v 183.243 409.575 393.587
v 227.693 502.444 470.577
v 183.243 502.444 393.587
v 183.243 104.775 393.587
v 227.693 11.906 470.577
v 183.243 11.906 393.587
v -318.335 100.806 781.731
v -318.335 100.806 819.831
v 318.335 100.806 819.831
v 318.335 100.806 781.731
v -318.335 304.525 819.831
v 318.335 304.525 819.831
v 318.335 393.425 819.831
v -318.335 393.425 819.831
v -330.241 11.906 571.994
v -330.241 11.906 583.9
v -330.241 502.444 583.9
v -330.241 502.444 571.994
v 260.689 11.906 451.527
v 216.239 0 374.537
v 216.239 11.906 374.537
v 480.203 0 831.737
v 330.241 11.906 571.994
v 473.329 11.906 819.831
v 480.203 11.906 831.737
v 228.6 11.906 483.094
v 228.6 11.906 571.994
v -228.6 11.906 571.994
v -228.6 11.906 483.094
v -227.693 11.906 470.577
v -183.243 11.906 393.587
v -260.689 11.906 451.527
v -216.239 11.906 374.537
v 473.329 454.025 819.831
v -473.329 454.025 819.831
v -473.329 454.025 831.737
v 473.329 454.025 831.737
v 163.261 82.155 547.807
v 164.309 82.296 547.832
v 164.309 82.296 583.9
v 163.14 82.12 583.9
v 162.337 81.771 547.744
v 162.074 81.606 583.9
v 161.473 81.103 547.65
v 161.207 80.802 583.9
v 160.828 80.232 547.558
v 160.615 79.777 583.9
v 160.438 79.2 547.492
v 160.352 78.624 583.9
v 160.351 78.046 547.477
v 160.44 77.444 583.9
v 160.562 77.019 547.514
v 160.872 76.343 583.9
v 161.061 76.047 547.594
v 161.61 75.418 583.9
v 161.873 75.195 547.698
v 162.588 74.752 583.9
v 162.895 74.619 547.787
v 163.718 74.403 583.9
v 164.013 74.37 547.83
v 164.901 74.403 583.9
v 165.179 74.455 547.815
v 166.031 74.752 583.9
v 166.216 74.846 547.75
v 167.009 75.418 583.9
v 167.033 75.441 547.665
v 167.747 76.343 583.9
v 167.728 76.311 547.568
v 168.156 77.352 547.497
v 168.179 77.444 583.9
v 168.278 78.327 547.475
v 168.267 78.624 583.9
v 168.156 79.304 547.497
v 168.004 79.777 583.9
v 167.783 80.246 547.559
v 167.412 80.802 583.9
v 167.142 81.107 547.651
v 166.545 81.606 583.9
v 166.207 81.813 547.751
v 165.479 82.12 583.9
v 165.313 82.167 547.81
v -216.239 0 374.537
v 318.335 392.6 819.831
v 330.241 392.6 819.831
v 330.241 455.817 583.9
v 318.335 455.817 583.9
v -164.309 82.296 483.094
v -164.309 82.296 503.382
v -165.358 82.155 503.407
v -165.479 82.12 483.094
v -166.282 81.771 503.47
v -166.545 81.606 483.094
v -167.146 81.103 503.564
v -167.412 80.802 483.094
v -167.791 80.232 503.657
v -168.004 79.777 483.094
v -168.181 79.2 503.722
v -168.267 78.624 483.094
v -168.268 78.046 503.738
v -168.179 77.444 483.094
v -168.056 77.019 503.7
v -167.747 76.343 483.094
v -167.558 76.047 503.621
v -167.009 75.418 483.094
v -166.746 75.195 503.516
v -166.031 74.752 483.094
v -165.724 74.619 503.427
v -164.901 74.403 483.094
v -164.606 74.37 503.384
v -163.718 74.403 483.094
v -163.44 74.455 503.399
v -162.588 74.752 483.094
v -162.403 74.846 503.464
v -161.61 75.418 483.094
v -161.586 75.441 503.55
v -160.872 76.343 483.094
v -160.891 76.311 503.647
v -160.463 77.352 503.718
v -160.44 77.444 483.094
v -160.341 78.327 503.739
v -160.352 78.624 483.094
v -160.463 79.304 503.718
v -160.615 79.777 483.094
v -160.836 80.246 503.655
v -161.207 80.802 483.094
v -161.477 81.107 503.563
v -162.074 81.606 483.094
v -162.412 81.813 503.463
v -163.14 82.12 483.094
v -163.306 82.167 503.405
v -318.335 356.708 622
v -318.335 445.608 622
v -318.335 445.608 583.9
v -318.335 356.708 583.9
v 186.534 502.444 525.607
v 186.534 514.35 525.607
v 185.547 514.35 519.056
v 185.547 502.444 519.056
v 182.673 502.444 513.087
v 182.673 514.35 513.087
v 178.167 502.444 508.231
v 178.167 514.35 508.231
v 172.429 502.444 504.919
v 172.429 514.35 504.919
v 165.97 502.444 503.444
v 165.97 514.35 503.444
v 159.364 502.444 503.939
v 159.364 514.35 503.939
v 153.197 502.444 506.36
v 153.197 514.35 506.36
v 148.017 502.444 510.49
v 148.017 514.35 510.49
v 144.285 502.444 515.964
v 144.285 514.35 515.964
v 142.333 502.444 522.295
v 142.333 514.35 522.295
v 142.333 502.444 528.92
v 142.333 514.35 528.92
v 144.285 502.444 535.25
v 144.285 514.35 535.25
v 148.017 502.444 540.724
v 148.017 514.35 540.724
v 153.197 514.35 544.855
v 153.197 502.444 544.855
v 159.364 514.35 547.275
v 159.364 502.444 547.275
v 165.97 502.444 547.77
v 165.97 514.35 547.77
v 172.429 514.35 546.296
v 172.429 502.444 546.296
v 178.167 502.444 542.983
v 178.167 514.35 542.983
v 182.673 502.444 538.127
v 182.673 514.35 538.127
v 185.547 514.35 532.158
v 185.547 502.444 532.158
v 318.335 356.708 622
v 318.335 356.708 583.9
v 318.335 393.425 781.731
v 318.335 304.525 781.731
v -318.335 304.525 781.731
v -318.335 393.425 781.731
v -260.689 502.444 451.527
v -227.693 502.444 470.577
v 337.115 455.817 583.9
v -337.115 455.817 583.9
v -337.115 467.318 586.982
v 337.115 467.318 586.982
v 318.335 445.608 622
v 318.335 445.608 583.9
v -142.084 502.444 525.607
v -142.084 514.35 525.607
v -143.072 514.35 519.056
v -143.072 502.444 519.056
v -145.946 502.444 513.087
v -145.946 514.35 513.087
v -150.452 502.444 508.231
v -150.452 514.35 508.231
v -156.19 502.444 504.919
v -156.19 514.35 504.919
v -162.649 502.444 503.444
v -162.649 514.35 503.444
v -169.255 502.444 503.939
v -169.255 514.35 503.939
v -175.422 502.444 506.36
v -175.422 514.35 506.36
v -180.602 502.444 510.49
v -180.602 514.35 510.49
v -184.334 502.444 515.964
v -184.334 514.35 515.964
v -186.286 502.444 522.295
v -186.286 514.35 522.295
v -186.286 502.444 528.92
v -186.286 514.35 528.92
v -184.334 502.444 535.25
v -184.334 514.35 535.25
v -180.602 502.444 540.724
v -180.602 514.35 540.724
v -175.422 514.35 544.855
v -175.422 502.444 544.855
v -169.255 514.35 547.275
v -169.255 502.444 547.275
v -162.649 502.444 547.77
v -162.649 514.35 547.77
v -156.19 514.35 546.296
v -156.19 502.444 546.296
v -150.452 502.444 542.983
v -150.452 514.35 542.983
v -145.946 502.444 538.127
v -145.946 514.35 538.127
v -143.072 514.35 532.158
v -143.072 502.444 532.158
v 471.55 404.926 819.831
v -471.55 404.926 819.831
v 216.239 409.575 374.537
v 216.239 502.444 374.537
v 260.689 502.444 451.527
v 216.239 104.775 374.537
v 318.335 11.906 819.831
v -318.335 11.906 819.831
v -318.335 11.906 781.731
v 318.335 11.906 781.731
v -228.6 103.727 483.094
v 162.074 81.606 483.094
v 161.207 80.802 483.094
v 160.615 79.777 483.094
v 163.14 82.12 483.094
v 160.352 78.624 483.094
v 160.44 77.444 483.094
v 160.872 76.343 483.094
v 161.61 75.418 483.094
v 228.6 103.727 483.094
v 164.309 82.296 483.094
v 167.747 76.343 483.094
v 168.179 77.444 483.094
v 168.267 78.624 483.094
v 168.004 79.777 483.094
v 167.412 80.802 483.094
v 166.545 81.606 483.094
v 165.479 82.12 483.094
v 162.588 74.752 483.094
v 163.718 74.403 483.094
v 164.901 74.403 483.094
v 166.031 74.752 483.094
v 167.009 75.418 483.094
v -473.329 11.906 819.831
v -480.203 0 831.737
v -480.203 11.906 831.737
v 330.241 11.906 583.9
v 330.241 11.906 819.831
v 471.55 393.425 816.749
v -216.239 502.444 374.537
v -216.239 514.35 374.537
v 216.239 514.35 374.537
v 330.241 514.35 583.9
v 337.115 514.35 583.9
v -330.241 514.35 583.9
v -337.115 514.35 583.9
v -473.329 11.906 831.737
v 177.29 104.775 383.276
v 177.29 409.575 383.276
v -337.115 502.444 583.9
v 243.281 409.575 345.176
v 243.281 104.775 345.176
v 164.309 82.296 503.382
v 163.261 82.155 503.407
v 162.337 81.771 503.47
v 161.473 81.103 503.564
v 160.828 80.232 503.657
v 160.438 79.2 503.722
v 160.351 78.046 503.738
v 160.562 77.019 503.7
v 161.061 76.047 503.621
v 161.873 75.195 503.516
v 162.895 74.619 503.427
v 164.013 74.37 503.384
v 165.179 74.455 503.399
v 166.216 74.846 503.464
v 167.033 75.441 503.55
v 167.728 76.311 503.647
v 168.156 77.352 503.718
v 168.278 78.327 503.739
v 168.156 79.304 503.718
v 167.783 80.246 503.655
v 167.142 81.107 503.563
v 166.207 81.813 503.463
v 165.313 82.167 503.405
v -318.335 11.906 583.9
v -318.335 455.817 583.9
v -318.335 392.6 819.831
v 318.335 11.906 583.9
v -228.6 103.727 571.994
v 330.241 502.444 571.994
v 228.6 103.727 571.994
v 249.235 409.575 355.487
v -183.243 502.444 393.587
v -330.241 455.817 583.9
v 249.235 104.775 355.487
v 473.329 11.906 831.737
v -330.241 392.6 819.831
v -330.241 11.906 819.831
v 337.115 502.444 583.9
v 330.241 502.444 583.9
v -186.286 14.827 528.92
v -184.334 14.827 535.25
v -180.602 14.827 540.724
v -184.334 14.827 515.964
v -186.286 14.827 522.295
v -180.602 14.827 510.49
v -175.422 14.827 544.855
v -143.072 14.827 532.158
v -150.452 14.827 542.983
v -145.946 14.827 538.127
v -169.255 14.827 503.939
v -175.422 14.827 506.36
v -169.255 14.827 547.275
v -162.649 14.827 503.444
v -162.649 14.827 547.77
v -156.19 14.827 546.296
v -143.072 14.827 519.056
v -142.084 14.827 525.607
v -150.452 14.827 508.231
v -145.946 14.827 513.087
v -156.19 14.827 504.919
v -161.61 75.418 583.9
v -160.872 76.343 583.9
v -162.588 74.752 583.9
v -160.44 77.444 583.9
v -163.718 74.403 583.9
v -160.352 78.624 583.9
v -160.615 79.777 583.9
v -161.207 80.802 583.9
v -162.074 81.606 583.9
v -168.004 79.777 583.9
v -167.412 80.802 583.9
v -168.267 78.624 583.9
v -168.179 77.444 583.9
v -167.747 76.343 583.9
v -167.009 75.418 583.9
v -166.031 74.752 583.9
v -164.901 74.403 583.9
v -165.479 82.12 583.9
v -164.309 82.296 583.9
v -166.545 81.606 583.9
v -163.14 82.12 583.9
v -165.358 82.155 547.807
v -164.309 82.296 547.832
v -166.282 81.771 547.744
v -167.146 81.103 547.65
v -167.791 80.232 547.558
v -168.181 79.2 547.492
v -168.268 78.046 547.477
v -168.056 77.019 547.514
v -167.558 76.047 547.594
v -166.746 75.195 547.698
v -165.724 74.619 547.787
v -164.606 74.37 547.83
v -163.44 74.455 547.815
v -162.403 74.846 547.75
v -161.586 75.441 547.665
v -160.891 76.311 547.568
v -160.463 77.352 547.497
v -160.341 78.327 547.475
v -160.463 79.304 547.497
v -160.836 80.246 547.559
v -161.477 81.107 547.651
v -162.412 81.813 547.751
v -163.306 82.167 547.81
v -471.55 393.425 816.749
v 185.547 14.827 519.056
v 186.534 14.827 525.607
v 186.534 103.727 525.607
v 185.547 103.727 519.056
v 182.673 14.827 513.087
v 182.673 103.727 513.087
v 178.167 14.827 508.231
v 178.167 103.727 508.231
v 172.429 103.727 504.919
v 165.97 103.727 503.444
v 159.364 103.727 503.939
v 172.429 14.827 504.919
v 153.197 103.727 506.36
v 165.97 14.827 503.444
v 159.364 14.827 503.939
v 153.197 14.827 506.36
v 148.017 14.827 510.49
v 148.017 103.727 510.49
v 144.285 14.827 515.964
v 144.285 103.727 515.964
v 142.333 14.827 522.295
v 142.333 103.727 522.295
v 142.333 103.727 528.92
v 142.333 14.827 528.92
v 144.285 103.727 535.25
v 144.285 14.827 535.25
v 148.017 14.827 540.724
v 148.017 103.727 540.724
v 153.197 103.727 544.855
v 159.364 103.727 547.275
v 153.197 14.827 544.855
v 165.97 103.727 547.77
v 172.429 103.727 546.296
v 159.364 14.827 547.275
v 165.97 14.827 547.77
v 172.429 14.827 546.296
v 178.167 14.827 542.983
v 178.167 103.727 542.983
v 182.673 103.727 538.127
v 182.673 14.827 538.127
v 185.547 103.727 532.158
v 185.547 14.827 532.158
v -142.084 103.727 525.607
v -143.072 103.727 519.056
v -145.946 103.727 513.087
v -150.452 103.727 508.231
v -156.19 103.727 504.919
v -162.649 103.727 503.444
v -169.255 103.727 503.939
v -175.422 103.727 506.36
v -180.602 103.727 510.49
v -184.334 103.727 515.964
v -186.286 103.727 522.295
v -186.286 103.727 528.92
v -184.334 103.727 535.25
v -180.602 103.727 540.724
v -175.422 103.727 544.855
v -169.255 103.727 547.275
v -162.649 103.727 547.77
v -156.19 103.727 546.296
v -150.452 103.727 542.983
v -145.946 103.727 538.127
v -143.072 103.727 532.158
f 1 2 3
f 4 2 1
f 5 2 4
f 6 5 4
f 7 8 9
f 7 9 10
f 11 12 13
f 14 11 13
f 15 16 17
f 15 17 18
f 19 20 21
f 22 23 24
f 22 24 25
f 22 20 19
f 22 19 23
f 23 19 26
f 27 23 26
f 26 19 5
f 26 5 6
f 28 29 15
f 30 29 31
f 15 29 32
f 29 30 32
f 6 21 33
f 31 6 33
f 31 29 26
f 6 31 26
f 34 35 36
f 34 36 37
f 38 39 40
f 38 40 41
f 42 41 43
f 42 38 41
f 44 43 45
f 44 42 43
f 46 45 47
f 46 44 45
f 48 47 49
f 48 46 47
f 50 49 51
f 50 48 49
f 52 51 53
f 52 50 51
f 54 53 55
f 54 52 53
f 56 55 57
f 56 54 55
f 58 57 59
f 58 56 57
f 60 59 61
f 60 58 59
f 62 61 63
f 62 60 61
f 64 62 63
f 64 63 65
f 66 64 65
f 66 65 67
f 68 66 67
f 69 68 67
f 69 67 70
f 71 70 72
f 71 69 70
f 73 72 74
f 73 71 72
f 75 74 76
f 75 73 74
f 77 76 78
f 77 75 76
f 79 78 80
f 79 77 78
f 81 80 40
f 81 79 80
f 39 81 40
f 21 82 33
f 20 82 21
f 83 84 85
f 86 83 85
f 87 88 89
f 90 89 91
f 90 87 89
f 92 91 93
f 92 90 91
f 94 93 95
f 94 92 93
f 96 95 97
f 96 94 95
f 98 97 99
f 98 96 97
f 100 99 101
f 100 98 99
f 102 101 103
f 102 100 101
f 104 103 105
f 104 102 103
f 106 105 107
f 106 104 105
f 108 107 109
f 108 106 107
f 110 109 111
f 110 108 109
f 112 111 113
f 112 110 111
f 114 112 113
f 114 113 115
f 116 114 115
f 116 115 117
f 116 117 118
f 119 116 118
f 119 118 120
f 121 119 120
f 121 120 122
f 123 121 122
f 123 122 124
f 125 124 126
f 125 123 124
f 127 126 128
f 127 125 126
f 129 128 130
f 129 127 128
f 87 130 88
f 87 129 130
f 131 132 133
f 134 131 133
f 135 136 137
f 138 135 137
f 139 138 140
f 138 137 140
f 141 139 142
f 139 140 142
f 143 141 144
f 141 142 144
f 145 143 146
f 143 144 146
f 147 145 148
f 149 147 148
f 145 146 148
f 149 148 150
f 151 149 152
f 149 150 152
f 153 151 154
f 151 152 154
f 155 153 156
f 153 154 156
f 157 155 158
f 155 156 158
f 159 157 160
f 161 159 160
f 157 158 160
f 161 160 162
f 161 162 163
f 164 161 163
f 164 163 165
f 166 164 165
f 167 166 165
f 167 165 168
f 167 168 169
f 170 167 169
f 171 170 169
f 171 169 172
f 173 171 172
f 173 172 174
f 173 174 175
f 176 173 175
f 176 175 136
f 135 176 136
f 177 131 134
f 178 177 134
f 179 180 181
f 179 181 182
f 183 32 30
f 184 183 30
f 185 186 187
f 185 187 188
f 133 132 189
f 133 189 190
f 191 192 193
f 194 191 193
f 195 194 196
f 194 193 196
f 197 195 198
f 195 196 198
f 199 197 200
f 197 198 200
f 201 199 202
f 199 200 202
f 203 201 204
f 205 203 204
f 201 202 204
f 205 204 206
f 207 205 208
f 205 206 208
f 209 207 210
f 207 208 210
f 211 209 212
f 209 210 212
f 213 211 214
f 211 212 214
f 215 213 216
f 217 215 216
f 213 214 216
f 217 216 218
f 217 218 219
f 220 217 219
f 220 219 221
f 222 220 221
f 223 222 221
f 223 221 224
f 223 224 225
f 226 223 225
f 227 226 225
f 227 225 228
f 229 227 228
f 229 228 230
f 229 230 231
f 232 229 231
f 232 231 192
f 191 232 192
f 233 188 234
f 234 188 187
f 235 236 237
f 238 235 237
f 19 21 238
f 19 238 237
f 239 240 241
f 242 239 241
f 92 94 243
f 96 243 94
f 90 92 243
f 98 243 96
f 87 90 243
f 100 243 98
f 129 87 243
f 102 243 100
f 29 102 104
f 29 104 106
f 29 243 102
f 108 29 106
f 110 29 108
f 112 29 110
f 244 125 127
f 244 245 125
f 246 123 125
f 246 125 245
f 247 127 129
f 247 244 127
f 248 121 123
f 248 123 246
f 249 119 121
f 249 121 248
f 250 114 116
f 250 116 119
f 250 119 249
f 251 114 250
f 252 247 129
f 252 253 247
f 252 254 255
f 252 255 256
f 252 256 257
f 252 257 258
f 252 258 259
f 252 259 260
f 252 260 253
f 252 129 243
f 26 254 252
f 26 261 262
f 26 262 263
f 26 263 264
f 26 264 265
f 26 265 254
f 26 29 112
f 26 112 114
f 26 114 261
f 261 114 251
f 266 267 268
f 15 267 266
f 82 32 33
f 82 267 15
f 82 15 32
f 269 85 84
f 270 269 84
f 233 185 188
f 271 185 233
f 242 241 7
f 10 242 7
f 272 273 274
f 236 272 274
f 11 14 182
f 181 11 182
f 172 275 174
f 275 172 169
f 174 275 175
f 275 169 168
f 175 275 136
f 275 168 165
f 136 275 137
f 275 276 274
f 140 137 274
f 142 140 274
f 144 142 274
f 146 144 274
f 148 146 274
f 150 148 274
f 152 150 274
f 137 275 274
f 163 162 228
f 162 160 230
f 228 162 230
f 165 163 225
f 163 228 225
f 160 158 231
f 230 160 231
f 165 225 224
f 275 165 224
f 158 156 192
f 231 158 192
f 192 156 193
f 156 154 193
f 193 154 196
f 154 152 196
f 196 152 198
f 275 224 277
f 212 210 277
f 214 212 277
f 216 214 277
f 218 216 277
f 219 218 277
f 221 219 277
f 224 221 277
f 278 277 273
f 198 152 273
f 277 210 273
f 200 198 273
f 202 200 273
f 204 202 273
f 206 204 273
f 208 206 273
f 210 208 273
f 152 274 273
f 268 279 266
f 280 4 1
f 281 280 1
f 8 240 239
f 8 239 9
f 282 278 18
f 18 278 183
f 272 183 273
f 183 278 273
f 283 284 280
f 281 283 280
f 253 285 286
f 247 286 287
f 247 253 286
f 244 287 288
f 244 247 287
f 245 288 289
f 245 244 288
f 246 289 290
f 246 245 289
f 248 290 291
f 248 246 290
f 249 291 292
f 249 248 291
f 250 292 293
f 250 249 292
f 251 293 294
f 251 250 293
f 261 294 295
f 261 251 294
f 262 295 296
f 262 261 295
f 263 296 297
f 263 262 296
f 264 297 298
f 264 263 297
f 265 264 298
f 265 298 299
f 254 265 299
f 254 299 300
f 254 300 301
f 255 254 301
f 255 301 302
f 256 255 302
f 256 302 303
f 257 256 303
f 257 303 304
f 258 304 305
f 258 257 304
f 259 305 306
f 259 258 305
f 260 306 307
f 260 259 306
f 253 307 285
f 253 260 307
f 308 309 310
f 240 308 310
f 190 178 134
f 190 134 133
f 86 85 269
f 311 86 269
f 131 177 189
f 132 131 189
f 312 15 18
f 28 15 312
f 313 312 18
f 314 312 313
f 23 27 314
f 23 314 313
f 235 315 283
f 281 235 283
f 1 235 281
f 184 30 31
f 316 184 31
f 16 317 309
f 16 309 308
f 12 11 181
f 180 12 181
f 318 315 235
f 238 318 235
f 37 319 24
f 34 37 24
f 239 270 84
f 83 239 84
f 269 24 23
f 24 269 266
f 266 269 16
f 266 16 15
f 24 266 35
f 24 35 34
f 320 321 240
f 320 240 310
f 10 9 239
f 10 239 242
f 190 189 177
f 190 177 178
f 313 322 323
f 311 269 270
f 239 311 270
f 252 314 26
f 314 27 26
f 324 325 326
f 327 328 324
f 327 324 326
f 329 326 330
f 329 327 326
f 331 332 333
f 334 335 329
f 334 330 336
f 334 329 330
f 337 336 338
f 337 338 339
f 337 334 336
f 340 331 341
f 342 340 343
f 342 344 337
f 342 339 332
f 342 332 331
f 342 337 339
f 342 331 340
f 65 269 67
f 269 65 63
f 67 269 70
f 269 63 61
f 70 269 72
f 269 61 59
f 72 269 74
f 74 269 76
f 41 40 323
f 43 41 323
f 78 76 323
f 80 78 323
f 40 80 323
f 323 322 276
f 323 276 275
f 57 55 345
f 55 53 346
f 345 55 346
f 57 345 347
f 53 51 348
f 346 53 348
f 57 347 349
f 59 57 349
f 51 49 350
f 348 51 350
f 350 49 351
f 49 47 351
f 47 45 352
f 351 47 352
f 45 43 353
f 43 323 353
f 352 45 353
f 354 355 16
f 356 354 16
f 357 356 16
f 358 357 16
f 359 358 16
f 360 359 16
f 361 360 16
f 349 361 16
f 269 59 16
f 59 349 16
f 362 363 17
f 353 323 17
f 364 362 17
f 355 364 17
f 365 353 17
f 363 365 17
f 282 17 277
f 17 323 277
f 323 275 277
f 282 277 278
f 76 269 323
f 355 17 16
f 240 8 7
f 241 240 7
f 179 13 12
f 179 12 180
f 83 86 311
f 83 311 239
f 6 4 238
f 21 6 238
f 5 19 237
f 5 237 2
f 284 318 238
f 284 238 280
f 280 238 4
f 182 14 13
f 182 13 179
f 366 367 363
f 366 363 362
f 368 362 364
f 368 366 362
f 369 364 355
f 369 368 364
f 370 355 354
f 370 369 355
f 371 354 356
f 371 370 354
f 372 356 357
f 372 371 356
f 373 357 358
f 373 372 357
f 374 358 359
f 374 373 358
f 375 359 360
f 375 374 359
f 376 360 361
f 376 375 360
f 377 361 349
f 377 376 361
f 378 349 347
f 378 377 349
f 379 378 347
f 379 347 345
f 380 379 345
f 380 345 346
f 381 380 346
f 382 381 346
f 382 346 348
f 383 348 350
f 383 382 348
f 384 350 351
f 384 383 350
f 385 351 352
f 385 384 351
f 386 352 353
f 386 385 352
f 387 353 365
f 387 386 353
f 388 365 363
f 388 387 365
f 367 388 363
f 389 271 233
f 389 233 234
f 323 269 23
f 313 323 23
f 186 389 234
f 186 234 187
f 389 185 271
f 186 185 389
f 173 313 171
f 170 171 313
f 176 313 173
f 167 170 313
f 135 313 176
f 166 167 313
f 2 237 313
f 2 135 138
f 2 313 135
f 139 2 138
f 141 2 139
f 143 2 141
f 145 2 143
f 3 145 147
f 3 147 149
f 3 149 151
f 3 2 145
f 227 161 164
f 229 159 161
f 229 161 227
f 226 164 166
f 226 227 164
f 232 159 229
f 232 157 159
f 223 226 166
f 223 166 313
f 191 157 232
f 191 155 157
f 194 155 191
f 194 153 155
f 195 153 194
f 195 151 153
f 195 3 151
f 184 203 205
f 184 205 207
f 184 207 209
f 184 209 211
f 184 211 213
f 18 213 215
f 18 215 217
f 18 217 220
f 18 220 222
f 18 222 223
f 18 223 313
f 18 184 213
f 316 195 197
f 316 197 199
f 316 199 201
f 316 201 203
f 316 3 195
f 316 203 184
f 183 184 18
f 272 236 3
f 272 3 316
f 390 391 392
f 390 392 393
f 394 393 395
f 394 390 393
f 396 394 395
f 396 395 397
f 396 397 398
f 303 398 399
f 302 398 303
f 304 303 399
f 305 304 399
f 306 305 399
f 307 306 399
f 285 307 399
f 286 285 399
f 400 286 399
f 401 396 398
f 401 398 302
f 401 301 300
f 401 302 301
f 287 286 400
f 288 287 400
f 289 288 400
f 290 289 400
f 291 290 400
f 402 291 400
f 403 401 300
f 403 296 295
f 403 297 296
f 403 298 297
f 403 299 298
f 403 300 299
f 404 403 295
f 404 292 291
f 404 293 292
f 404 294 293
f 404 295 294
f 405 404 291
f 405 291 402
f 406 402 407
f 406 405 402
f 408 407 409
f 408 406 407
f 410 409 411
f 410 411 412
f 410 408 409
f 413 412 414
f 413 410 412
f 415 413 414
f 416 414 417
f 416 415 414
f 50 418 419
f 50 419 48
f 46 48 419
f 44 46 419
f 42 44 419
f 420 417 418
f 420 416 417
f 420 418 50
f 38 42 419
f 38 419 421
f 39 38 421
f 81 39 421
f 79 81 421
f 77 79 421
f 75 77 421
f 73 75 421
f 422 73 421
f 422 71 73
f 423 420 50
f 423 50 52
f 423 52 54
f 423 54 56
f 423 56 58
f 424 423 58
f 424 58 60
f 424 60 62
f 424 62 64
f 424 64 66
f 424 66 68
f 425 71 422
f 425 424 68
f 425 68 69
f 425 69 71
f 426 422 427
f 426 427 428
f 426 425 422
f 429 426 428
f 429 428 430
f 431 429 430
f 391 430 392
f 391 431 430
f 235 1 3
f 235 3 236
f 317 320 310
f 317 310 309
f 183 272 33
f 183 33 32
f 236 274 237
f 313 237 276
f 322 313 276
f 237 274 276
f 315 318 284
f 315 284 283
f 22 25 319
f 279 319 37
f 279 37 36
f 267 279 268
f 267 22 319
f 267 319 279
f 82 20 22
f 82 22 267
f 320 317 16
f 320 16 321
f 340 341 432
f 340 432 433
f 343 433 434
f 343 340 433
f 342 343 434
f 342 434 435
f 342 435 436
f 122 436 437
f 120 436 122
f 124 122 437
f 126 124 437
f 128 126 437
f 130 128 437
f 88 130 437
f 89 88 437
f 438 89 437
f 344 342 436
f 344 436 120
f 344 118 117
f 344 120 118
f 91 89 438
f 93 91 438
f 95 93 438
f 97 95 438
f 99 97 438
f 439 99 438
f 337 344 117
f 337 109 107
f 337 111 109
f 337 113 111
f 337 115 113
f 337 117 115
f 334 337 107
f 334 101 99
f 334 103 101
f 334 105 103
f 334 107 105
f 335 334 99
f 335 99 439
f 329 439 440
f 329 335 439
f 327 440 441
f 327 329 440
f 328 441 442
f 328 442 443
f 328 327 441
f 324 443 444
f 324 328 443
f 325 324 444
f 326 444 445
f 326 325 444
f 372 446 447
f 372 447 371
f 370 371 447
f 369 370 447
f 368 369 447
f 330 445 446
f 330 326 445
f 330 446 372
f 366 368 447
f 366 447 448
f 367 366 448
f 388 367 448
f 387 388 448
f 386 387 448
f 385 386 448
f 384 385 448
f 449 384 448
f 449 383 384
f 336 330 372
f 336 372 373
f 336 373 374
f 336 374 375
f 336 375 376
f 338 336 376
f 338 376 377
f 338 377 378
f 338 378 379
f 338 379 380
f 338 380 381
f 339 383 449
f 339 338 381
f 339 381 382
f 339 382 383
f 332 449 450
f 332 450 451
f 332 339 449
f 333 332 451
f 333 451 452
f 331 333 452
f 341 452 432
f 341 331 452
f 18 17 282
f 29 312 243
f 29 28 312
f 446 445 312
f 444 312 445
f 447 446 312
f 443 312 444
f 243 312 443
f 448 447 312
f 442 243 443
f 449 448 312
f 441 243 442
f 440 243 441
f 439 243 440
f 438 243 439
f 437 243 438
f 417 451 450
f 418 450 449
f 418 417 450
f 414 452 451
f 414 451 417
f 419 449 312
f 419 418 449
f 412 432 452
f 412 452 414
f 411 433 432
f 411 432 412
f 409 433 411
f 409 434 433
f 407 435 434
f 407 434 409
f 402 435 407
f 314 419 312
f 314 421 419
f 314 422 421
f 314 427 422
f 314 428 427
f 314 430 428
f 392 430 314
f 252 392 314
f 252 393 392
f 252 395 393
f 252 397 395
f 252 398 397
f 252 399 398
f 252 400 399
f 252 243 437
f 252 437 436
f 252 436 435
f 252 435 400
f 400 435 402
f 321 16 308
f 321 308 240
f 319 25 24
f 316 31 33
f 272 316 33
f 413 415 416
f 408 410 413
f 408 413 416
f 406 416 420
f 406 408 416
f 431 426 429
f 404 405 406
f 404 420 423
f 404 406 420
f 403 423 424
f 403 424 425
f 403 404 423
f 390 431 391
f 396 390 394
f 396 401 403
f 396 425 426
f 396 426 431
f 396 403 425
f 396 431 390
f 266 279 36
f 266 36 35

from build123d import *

# Parameters (mm, degrees)
BOSS_EXTRUDE1_DEPTH                     = 11.90625
SKETCH3_W                               = 946.658829024
SKETCH3_H                               = 11.90625
BOSS_EXTRUDE2_DEPTH                     = 442.11875
SKETCH4_W                               = 660.481708072
SKETCH4_H                               = 11.90625
BOSS_EXTRUDE3_DEPTH                     = 502.444211
BOSS_EXTRUDE4_DEPTH                     = 11.90625
CUT_EXTRUDE2_REACH                      = 516.35
SKETCH6_R                               = 22.225
BOSS_EXTRUDE5_DEPTH                     = 11.90625
BOSS_EXTRUDE8_DEPTH                     = 11.90625
SKETCH9_W                               = 457.2
SKETCH9_H                               = 88.9
BOSS_EXTRUDE9_DEPTH                     = 2.921
SKETCH10_W                              = 457.2
SKETCH10_H                              = 88.9
SKETCH10_R                              = 22.225
BOSS_EXTRUDE10_DEPTH                    = 88.9
F_5_16_0_3125_DIAMETER_HOLE1_AT_2_COUNT = 2
F_5_16_0_3125_DIAMETER_HOLE1_AT_2_PITCH = 328.618993764
BOSS_EXTRUDE11_DEPTH                    = 490.537961
SKETCH12_W                              = 76.2
SKETCH12_H                              = 304.8
BOSS_EXTRUDE12_DEPTH                    = 11.90625
SKETCH18_W                              = 38.1
SKETCH18_H                              = 88.9
BOSS_EXTRUDE15_DEPTH                    = 636.669208
BOSS_EXTRUDE15_2_DEPTH                  = 636.669208
BOSS_EXTRUDE15_3_DEPTH                  = 636.669208


with BuildPart() as part:
    # Sketch2 → Boss-Extrude1 (new body)
    with BuildSketch(Plane(origin=(0, 0, 0), x_dir=(1, 0, 0), z_dir=(0, 1, 0))):
        Polygon((-480.203491154, -831.736844651), (-216.238948081, -374.536844651), (216.238948081, -374.536844651), (480.203491154, -831.736844651), align=None)
    extrude(amount=BOSS_EXTRUDE1_DEPTH)

    # Sketch3 → Boss-Extrude2 (add)
    with BuildSketch(Plane(origin=(0, 11.90625, 0), x_dir=(1, 0, 0), z_dir=(0, 1, 0))):
        with Locations((0, -825.783719651)):
            Rectangle(SKETCH3_W, SKETCH3_H)
    extrude(amount=BOSS_EXTRUDE2_DEPTH)

    # Sketch4 → Boss-Extrude3 (add)
    with BuildSketch(Plane(origin=(0, 11.90625, 0), x_dir=(1, 0, 0), z_dir=(0, 1, 0))):
        with Locations((0, -577.947062925)):
            Rectangle(SKETCH4_W, SKETCH4_H)
    extrude(amount=BOSS_EXTRUDE3_DEPTH)

    # Sketch5 → Boss-Extrude4 (add)
    with BuildSketch(Plane(origin=(0, 514.35046101, 0), x_dir=(1, 0, 0), z_dir=(0, 1, 0))):
        Polygon((-337.114930678, -583.900187925), (-216.238948081, -374.536844651), (216.238948081, -374.536844651), (337.114930678, -583.900187925), align=None)
    extrude(amount=-BOSS_EXTRUDE4_DEPTH)

    # Sketch6 → Cut-Extrude2 (cut, up to next)
    with BuildSketch(Plane(origin=(0, 514.35046101, 0), x_dir=(1, 0, 0), z_dir=(0, 1, 0)), mode=Mode.PRIVATE) as cut_extrude2_sk1:
        with Locations((-164.309496882, -525.607187925)):
            Circle(SKETCH6_R)
    cut_extrude2_tool1 = extrude(cut_extrude2_sk1.sketch, amount=-CUT_EXTRUDE2_REACH, mode=Mode.PRIVATE) & part.part
    add(cut_extrude2_tool1.solids().sort_by_distance((-164.309497, 514.350461, 525.607188))[0], mode=Mode.SUBTRACT)
    # Sketch6 → Cut-Extrude2 (cut, up to next)
    with BuildSketch(Plane(origin=(0, 514.35046101, 0), x_dir=(1, 0, 0), z_dir=(0, 1, 0)), mode=Mode.PRIVATE) as cut_extrude2_sk2:
        with Locations((164.309496882, -525.607187925)):
            Circle(SKETCH6_R)
    cut_extrude2_tool2 = extrude(cut_extrude2_sk2.sketch, amount=-CUT_EXTRUDE2_REACH, mode=Mode.PRIVATE) & part.part
    add(cut_extrude2_tool2.solids().sort_by_distance((164.309497, 514.350461, 525.607188))[0], mode=Mode.SUBTRACT)

    # Sketch9 → Boss-Extrude9 (add)
    with BuildSketch(Plane(origin=(0, 11.90625, 0), x_dir=(1, 0, 0), z_dir=(0, 1, 0))):
        with Locations((0, -527.543937925)):
            Rectangle(SKETCH9_W, SKETCH9_H)
    extrude(amount=BOSS_EXTRUDE9_DEPTH)

    # Sketch10 → Boss-Extrude10 (add)
    with BuildSketch(Plane(origin=(0, 14.82725, 0), x_dir=(1, 0, 0), z_dir=(0, 1, 0))):
        with Locations((0, -527.543937925)):
            Rectangle(SKETCH10_W, SKETCH10_H)
        with Locations((-164.309496882, -525.607187925)):
            Circle(SKETCH10_R, mode=Mode.SUBTRACT)
        with Locations((164.309496882, -525.607187925)):
            Circle(SKETCH10_R, mode=Mode.SUBTRACT)
    extrude(amount=BOSS_EXTRUDE10_DEPTH)

    # Sketch15 → 5/16 (0.3125) Diameter Hole1 (revolve, cut)
    with BuildSketch(Plane(origin=(164.309496882, 78.32725, 483.093937925), x_dir=(0, 1, 0), z_dir=(1, 0, 0))):
        Polygon((0, 0), (0, 103.190915582), (3.96875, 100.80625), (3.96875, 0), align=None)
    f_5_16_0_3125_diameter_hole1 = revolve(axis=Axis((164.309496882, 78.32725, 476.743937925), (0, 0, 1)), mode=Mode.SUBTRACT)

    # 5/16 (0.3125) Diameter Hole1 at 2: 5/16 (0.3125) Diameter Hole1 ×2
    with Locations(*[(-i * F_5_16_0_3125_DIAMETER_HOLE1_AT_2_PITCH, 0, 0) for i in range(1, F_5_16_0_3125_DIAMETER_HOLE1_AT_2_COUNT)]):
        add(f_5_16_0_3125_diameter_hole1, mode=Mode.SUBTRACT)

    # Sketch11 → Boss-Extrude11 (add)
    with BuildSketch(Plane(origin=(0, 11.90625, 0), x_dir=(1, 0, 0), z_dir=(0, 1, 0))):
        Polygon((216.238948081, -374.536844651), (260.688948081, -451.526503047), (227.693380197, -470.576503047), (183.243380197, -393.586844651), align=None)
        Polygon((-216.238948081, -374.536844651), (-260.688948081, -451.526503047), (-227.693380196, -470.576503047), (-183.243380196, -393.586844651), align=None)
    extrude(amount=BOSS_EXTRUDE11_DEPTH)

    # Sketch12 → Boss-Extrude12 (add)
    with BuildSketch(Plane(origin=(216.238948081, 0, 374.536844651), x_dir=(-0.866025404, 0, 0.5), z_dir=(-0.5, 0, -0.866025404))):
        with Locations((0, 257.175230505)):
            Rectangle(SKETCH12_W, SKETCH12_H)
    extrude(amount=BOSS_EXTRUDE12_DEPTH)


with BuildPart() as body_2:
    # Sketch7 → Boss-Extrude5 (new body)
    with BuildSketch(Plane(origin=(0, 571.258129571, 153.068154488), x_dir=(1, 0, 0), z_dir=(0, 0.965925826, 0.258819045))):
        Polygon((-471.550272559, -687.09300222), (-337.114930678, -446.030141975), (337.114930678, -446.030141975), (471.550272559, -687.09300222), align=None)
    extrude(amount=BOSS_EXTRUDE5_DEPTH)


with BuildPart() as body_3:
    # Sketch8 → Boss-Extrude8 (new body)
    with BuildSketch(Plane(origin=(330.240854036, 0, 0), x_dir=(0, 0, -1), z_dir=(1, 0, 0))):
        Polygon((-819.830594651, 11.90625), (-819.830594651, 392.599672186), (-583.900187925, 455.817034138), (-583.900187925, 11.90625), align=None)
    extrude(amount=-BOSS_EXTRUDE8_DEPTH)


with BuildPart() as body_4:
    # Mirror2: mirrored copy
    add(body_3.part.mirror(Plane(origin=(0, 0, 0), x_dir=(0, 0, 1), z_dir=(1, 0, 0))))


with BuildPart() as body_5:
    # Sketch18 → Boss-Extrude15 (new body)
    with BuildSketch(Plane(origin=(318.334604036, 0, 0), x_dir=(0, 0, -1), z_dir=(1, 0, 0))):
        with Locations((-602.950187925, 401.158169907)):
            Rectangle(SKETCH18_W, SKETCH18_H)
    extrude(amount=-BOSS_EXTRUDE15_DEPTH)


with BuildPart() as body_6:
    # Sketch18 → Boss-Extrude15 2 (new body)
    with BuildSketch(Plane(origin=(318.334604036, 0, 0), x_dir=(0, 0, -1), z_dir=(1, 0, 0))):
        with Locations((-800.780594651, 348.97537484)):
            Rectangle(SKETCH18_W, SKETCH18_H)
    extrude(amount=-BOSS_EXTRUDE15_2_DEPTH)


with BuildPart() as body_7:
    # Sketch18 → Boss-Extrude15 3 (new body)
    with BuildSketch(Plane(origin=(318.334604036, 0, 0), x_dir=(0, 0, -1), z_dir=(1, 0, 0))):
        with Locations((-800.780594651, 56.35625)):
            Rectangle(SKETCH18_W, SKETCH18_H)
    extrude(amount=-BOSS_EXTRUDE15_3_DEPTH)


solid = Compound([part.part, body_2.part, body_3.part, body_4.part, body_5.part, body_6.part, body_7.part])
